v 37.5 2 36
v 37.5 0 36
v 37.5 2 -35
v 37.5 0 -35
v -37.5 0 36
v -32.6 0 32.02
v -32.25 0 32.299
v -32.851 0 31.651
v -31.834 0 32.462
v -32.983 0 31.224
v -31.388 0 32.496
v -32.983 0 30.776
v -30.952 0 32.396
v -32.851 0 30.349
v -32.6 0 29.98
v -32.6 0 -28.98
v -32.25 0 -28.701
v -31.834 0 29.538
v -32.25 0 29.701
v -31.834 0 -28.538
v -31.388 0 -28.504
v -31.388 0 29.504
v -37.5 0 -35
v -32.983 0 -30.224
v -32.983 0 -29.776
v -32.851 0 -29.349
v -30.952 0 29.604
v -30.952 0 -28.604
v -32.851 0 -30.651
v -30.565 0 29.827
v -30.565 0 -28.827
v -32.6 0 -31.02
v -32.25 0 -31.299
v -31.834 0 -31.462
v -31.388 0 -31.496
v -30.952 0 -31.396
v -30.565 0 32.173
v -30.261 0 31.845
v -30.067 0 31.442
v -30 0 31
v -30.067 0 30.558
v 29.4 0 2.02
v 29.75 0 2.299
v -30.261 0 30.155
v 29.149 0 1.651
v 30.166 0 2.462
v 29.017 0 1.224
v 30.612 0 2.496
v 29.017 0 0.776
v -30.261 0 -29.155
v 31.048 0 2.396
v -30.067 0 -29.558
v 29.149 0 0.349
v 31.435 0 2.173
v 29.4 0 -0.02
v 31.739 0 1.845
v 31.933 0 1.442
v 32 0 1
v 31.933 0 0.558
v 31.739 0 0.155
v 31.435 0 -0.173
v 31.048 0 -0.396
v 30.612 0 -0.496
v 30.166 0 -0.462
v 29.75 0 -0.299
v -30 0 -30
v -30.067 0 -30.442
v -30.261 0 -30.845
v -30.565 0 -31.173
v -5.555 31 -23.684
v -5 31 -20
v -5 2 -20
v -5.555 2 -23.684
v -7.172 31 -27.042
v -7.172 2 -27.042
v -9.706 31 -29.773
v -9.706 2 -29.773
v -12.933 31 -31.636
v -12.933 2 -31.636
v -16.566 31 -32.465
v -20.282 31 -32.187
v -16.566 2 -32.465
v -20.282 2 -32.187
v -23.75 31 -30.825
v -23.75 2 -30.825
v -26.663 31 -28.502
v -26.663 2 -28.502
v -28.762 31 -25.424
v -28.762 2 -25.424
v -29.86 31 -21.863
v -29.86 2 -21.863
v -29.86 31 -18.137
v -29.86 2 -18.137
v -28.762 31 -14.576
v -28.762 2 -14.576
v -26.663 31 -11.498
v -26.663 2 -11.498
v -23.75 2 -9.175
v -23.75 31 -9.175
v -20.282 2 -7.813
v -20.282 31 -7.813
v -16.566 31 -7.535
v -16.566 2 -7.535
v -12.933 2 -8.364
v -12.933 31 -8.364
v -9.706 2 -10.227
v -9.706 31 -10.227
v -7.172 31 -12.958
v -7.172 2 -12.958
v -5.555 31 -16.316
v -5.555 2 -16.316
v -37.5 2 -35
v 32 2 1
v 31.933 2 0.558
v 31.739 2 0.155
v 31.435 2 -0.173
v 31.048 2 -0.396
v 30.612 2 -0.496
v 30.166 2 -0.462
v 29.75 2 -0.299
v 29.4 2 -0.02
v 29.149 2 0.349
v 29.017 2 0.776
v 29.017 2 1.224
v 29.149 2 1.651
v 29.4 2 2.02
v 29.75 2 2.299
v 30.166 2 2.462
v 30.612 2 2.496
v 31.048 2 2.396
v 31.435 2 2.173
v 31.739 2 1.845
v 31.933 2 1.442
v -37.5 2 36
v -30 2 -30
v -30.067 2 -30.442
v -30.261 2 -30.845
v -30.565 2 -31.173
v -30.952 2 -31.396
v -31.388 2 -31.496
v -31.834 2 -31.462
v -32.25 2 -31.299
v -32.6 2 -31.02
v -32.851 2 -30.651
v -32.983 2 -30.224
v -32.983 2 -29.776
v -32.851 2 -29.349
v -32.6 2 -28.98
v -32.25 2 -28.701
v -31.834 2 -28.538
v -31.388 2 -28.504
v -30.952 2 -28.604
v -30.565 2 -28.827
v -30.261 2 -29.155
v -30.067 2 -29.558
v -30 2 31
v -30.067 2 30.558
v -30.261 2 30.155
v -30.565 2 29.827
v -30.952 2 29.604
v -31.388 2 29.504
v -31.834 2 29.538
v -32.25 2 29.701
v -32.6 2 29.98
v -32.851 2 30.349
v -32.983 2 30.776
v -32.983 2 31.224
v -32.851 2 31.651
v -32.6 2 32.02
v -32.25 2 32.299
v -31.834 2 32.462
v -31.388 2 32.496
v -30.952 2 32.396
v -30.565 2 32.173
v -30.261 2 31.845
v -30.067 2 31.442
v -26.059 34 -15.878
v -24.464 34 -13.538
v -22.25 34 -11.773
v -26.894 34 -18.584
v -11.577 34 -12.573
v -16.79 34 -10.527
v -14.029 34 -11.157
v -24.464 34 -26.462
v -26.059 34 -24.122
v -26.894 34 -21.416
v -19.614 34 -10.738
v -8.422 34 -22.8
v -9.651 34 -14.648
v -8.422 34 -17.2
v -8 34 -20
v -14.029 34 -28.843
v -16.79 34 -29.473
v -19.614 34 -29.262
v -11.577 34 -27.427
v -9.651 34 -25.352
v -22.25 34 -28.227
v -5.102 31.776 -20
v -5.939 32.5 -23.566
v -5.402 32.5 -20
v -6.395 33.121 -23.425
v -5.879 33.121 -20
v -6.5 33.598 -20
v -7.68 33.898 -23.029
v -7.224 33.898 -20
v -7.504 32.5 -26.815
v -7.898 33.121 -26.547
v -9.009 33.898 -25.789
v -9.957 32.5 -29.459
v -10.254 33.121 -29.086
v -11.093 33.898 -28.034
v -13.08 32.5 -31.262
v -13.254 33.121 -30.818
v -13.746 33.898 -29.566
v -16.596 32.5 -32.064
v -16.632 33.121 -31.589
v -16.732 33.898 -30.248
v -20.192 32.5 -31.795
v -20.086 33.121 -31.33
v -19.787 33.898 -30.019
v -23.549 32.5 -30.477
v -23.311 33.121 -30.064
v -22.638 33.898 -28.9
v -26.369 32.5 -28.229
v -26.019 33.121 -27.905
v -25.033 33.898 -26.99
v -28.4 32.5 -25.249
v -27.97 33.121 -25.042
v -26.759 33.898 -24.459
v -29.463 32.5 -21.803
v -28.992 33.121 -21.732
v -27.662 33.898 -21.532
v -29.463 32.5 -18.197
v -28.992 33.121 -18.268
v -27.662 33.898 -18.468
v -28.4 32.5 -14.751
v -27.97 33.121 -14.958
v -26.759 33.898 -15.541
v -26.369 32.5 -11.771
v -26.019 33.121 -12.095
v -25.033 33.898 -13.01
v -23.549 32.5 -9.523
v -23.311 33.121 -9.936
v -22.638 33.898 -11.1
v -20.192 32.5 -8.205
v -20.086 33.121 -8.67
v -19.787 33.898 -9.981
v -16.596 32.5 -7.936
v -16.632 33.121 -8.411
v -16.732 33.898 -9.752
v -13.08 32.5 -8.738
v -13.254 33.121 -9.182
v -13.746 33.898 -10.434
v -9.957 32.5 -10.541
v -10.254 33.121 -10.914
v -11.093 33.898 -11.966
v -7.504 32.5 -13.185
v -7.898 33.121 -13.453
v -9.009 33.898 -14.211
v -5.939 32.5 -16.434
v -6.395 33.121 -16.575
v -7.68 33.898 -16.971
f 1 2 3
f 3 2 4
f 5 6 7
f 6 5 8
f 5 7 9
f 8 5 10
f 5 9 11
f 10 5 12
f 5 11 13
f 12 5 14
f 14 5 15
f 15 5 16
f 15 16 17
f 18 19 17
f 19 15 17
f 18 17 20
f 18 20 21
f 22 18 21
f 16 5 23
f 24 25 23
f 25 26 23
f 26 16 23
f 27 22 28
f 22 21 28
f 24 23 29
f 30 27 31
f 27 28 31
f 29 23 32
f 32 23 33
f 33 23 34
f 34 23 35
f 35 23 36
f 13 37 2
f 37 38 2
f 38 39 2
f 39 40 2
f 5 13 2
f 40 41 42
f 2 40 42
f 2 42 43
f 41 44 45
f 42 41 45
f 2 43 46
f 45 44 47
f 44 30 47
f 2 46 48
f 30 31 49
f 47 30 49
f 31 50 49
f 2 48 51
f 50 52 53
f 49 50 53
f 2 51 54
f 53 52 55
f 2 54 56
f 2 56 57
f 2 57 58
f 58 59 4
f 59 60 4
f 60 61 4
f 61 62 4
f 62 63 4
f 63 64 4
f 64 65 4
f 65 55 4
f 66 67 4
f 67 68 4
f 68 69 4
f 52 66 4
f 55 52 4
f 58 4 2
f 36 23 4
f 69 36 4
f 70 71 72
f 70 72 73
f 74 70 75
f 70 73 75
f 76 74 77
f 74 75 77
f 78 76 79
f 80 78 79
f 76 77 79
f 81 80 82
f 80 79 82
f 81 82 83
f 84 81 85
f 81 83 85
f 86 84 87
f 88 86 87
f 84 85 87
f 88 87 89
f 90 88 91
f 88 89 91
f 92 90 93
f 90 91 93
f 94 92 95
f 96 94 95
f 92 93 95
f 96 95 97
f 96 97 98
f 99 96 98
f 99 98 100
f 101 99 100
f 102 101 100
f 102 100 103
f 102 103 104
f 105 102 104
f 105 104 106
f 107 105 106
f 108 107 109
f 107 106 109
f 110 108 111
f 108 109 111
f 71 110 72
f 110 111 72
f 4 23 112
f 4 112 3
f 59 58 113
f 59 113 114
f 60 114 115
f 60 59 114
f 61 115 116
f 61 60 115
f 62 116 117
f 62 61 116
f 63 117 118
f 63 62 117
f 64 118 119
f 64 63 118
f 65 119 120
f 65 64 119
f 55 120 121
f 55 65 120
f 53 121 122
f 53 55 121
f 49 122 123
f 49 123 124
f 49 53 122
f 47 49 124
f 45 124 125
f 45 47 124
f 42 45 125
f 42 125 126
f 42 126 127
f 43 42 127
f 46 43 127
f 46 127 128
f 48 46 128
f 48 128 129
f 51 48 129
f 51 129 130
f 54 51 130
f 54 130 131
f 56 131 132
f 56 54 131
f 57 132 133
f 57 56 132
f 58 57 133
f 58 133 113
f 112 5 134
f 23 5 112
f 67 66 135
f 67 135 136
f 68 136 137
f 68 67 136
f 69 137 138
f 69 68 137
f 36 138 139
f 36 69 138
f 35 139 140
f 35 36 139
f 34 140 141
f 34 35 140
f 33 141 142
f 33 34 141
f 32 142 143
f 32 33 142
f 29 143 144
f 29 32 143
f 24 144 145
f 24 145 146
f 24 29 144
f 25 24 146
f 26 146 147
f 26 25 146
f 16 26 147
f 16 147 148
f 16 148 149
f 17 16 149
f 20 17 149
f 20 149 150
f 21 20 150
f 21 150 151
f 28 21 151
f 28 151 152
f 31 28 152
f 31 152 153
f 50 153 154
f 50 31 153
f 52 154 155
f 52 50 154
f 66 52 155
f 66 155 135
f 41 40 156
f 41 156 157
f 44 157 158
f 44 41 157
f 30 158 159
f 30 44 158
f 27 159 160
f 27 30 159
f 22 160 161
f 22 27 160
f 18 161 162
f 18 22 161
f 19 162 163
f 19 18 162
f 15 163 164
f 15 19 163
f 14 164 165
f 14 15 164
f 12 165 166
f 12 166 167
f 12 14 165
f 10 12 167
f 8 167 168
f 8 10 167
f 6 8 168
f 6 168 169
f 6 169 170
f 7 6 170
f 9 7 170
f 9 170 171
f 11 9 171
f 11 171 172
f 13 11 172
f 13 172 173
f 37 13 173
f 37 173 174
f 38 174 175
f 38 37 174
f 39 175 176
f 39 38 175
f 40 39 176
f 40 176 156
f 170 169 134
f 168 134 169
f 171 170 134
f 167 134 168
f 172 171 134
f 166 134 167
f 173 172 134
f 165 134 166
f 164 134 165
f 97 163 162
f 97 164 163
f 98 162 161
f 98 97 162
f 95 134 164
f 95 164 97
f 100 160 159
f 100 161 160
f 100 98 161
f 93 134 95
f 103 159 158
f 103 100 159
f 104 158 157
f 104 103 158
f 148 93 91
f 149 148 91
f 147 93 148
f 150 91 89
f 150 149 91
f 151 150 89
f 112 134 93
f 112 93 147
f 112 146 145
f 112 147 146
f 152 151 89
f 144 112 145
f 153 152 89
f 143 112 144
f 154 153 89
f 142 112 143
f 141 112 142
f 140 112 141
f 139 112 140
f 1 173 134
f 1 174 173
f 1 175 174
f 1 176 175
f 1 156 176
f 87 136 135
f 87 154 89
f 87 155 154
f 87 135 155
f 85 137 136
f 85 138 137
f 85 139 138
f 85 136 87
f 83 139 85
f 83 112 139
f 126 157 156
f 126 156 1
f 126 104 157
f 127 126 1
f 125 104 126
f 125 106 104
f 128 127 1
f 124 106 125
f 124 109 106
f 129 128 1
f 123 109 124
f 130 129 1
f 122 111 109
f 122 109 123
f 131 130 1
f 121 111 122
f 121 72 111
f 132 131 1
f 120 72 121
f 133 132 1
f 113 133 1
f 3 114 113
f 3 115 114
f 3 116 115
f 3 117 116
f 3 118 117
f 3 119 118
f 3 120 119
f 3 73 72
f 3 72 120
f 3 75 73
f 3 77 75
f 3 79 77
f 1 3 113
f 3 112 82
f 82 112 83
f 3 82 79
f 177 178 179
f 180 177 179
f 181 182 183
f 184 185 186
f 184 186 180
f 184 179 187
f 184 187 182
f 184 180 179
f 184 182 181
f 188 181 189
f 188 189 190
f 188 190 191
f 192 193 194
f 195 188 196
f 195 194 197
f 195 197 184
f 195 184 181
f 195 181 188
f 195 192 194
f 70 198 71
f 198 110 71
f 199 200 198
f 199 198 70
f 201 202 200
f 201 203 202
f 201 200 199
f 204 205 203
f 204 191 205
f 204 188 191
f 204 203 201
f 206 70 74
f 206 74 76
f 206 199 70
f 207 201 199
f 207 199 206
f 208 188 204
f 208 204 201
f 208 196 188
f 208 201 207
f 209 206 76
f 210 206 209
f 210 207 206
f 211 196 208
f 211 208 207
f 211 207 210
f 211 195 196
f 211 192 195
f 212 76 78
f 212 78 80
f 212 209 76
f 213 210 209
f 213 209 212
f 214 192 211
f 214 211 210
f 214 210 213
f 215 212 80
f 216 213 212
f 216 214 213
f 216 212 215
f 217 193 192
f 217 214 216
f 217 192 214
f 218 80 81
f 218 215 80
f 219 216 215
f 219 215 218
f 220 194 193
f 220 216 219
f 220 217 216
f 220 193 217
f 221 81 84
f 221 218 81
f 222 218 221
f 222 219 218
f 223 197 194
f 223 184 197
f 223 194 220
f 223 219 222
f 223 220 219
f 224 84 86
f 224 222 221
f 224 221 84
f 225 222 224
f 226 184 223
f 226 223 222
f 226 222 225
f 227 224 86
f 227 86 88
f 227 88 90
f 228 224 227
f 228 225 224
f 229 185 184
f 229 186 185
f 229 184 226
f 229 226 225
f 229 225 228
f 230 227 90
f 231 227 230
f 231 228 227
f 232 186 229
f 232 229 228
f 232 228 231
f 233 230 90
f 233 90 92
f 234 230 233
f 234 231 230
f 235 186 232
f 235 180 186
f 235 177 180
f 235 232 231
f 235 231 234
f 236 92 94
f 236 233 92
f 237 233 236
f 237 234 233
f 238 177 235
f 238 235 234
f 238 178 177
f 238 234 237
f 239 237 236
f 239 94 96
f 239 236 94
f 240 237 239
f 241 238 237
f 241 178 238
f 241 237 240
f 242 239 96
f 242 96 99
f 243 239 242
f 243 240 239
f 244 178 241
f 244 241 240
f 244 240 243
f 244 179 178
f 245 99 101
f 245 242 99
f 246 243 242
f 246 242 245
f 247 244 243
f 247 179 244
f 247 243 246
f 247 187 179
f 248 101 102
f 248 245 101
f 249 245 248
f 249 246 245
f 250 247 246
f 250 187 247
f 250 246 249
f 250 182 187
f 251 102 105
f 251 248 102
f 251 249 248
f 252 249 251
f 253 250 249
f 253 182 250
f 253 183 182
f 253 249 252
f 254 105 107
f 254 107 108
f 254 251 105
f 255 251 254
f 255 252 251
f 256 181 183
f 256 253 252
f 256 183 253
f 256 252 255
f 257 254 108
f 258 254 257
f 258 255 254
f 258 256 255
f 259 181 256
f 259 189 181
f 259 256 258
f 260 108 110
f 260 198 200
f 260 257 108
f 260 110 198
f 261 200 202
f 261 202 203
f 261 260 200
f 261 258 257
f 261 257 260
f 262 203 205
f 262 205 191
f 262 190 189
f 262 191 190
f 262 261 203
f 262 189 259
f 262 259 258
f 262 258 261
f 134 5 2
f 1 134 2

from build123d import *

# Parameters (mm, degrees)
ESQUISSE1_W        = 75
ESQUISSE1_H        = 71
ESQUISSE1_R        = 1.5
BOSS_EXTRU_1_DEPTH = 2
ESQUISSE3_R        = 12.5
BOSS_EXTRU_2_DEPTH = 32
CONG_1_R           = 3


with BuildPart() as part:
    # Esquisse1 → Boss.-Extru.1 (new body)
    with BuildSketch(Plane(origin=(0, 0, 0), x_dir=(1, 0, 0), z_dir=(0, 1, 0))):
        with Locations((0, -0.5)):
            Rectangle(ESQUISSE1_W, ESQUISSE1_H)
        with Locations((-31.5, 30)):
            Circle(ESQUISSE1_R, mode=Mode.SUBTRACT)
        with Locations((-31.5, -31)):
            Circle(ESQUISSE1_R, mode=Mode.SUBTRACT)
        with Locations((30.5, -1)):
            Circle(ESQUISSE1_R, mode=Mode.SUBTRACT)
    extrude(amount=BOSS_EXTRU_1_DEPTH)

    # Esquisse3 → Boss.-Extru.2 (add)
    with BuildSketch(Plane(origin=(0, 2, 0), x_dir=(1, 0, 0), z_dir=(0, 1, 0))):
        with Locations((-17.5, 20)):
            Circle(ESQUISSE3_R)
    extrude(amount=BOSS_EXTRU_2_DEPTH)

    # Congé1
    cong_1_edges = [part.edges().sort_by_distance(p)[0] for p in [
        (-30, 34, -20),
    ]]
    fillet(cong_1_edges, radius=CONG_1_R)


solid = part.part
